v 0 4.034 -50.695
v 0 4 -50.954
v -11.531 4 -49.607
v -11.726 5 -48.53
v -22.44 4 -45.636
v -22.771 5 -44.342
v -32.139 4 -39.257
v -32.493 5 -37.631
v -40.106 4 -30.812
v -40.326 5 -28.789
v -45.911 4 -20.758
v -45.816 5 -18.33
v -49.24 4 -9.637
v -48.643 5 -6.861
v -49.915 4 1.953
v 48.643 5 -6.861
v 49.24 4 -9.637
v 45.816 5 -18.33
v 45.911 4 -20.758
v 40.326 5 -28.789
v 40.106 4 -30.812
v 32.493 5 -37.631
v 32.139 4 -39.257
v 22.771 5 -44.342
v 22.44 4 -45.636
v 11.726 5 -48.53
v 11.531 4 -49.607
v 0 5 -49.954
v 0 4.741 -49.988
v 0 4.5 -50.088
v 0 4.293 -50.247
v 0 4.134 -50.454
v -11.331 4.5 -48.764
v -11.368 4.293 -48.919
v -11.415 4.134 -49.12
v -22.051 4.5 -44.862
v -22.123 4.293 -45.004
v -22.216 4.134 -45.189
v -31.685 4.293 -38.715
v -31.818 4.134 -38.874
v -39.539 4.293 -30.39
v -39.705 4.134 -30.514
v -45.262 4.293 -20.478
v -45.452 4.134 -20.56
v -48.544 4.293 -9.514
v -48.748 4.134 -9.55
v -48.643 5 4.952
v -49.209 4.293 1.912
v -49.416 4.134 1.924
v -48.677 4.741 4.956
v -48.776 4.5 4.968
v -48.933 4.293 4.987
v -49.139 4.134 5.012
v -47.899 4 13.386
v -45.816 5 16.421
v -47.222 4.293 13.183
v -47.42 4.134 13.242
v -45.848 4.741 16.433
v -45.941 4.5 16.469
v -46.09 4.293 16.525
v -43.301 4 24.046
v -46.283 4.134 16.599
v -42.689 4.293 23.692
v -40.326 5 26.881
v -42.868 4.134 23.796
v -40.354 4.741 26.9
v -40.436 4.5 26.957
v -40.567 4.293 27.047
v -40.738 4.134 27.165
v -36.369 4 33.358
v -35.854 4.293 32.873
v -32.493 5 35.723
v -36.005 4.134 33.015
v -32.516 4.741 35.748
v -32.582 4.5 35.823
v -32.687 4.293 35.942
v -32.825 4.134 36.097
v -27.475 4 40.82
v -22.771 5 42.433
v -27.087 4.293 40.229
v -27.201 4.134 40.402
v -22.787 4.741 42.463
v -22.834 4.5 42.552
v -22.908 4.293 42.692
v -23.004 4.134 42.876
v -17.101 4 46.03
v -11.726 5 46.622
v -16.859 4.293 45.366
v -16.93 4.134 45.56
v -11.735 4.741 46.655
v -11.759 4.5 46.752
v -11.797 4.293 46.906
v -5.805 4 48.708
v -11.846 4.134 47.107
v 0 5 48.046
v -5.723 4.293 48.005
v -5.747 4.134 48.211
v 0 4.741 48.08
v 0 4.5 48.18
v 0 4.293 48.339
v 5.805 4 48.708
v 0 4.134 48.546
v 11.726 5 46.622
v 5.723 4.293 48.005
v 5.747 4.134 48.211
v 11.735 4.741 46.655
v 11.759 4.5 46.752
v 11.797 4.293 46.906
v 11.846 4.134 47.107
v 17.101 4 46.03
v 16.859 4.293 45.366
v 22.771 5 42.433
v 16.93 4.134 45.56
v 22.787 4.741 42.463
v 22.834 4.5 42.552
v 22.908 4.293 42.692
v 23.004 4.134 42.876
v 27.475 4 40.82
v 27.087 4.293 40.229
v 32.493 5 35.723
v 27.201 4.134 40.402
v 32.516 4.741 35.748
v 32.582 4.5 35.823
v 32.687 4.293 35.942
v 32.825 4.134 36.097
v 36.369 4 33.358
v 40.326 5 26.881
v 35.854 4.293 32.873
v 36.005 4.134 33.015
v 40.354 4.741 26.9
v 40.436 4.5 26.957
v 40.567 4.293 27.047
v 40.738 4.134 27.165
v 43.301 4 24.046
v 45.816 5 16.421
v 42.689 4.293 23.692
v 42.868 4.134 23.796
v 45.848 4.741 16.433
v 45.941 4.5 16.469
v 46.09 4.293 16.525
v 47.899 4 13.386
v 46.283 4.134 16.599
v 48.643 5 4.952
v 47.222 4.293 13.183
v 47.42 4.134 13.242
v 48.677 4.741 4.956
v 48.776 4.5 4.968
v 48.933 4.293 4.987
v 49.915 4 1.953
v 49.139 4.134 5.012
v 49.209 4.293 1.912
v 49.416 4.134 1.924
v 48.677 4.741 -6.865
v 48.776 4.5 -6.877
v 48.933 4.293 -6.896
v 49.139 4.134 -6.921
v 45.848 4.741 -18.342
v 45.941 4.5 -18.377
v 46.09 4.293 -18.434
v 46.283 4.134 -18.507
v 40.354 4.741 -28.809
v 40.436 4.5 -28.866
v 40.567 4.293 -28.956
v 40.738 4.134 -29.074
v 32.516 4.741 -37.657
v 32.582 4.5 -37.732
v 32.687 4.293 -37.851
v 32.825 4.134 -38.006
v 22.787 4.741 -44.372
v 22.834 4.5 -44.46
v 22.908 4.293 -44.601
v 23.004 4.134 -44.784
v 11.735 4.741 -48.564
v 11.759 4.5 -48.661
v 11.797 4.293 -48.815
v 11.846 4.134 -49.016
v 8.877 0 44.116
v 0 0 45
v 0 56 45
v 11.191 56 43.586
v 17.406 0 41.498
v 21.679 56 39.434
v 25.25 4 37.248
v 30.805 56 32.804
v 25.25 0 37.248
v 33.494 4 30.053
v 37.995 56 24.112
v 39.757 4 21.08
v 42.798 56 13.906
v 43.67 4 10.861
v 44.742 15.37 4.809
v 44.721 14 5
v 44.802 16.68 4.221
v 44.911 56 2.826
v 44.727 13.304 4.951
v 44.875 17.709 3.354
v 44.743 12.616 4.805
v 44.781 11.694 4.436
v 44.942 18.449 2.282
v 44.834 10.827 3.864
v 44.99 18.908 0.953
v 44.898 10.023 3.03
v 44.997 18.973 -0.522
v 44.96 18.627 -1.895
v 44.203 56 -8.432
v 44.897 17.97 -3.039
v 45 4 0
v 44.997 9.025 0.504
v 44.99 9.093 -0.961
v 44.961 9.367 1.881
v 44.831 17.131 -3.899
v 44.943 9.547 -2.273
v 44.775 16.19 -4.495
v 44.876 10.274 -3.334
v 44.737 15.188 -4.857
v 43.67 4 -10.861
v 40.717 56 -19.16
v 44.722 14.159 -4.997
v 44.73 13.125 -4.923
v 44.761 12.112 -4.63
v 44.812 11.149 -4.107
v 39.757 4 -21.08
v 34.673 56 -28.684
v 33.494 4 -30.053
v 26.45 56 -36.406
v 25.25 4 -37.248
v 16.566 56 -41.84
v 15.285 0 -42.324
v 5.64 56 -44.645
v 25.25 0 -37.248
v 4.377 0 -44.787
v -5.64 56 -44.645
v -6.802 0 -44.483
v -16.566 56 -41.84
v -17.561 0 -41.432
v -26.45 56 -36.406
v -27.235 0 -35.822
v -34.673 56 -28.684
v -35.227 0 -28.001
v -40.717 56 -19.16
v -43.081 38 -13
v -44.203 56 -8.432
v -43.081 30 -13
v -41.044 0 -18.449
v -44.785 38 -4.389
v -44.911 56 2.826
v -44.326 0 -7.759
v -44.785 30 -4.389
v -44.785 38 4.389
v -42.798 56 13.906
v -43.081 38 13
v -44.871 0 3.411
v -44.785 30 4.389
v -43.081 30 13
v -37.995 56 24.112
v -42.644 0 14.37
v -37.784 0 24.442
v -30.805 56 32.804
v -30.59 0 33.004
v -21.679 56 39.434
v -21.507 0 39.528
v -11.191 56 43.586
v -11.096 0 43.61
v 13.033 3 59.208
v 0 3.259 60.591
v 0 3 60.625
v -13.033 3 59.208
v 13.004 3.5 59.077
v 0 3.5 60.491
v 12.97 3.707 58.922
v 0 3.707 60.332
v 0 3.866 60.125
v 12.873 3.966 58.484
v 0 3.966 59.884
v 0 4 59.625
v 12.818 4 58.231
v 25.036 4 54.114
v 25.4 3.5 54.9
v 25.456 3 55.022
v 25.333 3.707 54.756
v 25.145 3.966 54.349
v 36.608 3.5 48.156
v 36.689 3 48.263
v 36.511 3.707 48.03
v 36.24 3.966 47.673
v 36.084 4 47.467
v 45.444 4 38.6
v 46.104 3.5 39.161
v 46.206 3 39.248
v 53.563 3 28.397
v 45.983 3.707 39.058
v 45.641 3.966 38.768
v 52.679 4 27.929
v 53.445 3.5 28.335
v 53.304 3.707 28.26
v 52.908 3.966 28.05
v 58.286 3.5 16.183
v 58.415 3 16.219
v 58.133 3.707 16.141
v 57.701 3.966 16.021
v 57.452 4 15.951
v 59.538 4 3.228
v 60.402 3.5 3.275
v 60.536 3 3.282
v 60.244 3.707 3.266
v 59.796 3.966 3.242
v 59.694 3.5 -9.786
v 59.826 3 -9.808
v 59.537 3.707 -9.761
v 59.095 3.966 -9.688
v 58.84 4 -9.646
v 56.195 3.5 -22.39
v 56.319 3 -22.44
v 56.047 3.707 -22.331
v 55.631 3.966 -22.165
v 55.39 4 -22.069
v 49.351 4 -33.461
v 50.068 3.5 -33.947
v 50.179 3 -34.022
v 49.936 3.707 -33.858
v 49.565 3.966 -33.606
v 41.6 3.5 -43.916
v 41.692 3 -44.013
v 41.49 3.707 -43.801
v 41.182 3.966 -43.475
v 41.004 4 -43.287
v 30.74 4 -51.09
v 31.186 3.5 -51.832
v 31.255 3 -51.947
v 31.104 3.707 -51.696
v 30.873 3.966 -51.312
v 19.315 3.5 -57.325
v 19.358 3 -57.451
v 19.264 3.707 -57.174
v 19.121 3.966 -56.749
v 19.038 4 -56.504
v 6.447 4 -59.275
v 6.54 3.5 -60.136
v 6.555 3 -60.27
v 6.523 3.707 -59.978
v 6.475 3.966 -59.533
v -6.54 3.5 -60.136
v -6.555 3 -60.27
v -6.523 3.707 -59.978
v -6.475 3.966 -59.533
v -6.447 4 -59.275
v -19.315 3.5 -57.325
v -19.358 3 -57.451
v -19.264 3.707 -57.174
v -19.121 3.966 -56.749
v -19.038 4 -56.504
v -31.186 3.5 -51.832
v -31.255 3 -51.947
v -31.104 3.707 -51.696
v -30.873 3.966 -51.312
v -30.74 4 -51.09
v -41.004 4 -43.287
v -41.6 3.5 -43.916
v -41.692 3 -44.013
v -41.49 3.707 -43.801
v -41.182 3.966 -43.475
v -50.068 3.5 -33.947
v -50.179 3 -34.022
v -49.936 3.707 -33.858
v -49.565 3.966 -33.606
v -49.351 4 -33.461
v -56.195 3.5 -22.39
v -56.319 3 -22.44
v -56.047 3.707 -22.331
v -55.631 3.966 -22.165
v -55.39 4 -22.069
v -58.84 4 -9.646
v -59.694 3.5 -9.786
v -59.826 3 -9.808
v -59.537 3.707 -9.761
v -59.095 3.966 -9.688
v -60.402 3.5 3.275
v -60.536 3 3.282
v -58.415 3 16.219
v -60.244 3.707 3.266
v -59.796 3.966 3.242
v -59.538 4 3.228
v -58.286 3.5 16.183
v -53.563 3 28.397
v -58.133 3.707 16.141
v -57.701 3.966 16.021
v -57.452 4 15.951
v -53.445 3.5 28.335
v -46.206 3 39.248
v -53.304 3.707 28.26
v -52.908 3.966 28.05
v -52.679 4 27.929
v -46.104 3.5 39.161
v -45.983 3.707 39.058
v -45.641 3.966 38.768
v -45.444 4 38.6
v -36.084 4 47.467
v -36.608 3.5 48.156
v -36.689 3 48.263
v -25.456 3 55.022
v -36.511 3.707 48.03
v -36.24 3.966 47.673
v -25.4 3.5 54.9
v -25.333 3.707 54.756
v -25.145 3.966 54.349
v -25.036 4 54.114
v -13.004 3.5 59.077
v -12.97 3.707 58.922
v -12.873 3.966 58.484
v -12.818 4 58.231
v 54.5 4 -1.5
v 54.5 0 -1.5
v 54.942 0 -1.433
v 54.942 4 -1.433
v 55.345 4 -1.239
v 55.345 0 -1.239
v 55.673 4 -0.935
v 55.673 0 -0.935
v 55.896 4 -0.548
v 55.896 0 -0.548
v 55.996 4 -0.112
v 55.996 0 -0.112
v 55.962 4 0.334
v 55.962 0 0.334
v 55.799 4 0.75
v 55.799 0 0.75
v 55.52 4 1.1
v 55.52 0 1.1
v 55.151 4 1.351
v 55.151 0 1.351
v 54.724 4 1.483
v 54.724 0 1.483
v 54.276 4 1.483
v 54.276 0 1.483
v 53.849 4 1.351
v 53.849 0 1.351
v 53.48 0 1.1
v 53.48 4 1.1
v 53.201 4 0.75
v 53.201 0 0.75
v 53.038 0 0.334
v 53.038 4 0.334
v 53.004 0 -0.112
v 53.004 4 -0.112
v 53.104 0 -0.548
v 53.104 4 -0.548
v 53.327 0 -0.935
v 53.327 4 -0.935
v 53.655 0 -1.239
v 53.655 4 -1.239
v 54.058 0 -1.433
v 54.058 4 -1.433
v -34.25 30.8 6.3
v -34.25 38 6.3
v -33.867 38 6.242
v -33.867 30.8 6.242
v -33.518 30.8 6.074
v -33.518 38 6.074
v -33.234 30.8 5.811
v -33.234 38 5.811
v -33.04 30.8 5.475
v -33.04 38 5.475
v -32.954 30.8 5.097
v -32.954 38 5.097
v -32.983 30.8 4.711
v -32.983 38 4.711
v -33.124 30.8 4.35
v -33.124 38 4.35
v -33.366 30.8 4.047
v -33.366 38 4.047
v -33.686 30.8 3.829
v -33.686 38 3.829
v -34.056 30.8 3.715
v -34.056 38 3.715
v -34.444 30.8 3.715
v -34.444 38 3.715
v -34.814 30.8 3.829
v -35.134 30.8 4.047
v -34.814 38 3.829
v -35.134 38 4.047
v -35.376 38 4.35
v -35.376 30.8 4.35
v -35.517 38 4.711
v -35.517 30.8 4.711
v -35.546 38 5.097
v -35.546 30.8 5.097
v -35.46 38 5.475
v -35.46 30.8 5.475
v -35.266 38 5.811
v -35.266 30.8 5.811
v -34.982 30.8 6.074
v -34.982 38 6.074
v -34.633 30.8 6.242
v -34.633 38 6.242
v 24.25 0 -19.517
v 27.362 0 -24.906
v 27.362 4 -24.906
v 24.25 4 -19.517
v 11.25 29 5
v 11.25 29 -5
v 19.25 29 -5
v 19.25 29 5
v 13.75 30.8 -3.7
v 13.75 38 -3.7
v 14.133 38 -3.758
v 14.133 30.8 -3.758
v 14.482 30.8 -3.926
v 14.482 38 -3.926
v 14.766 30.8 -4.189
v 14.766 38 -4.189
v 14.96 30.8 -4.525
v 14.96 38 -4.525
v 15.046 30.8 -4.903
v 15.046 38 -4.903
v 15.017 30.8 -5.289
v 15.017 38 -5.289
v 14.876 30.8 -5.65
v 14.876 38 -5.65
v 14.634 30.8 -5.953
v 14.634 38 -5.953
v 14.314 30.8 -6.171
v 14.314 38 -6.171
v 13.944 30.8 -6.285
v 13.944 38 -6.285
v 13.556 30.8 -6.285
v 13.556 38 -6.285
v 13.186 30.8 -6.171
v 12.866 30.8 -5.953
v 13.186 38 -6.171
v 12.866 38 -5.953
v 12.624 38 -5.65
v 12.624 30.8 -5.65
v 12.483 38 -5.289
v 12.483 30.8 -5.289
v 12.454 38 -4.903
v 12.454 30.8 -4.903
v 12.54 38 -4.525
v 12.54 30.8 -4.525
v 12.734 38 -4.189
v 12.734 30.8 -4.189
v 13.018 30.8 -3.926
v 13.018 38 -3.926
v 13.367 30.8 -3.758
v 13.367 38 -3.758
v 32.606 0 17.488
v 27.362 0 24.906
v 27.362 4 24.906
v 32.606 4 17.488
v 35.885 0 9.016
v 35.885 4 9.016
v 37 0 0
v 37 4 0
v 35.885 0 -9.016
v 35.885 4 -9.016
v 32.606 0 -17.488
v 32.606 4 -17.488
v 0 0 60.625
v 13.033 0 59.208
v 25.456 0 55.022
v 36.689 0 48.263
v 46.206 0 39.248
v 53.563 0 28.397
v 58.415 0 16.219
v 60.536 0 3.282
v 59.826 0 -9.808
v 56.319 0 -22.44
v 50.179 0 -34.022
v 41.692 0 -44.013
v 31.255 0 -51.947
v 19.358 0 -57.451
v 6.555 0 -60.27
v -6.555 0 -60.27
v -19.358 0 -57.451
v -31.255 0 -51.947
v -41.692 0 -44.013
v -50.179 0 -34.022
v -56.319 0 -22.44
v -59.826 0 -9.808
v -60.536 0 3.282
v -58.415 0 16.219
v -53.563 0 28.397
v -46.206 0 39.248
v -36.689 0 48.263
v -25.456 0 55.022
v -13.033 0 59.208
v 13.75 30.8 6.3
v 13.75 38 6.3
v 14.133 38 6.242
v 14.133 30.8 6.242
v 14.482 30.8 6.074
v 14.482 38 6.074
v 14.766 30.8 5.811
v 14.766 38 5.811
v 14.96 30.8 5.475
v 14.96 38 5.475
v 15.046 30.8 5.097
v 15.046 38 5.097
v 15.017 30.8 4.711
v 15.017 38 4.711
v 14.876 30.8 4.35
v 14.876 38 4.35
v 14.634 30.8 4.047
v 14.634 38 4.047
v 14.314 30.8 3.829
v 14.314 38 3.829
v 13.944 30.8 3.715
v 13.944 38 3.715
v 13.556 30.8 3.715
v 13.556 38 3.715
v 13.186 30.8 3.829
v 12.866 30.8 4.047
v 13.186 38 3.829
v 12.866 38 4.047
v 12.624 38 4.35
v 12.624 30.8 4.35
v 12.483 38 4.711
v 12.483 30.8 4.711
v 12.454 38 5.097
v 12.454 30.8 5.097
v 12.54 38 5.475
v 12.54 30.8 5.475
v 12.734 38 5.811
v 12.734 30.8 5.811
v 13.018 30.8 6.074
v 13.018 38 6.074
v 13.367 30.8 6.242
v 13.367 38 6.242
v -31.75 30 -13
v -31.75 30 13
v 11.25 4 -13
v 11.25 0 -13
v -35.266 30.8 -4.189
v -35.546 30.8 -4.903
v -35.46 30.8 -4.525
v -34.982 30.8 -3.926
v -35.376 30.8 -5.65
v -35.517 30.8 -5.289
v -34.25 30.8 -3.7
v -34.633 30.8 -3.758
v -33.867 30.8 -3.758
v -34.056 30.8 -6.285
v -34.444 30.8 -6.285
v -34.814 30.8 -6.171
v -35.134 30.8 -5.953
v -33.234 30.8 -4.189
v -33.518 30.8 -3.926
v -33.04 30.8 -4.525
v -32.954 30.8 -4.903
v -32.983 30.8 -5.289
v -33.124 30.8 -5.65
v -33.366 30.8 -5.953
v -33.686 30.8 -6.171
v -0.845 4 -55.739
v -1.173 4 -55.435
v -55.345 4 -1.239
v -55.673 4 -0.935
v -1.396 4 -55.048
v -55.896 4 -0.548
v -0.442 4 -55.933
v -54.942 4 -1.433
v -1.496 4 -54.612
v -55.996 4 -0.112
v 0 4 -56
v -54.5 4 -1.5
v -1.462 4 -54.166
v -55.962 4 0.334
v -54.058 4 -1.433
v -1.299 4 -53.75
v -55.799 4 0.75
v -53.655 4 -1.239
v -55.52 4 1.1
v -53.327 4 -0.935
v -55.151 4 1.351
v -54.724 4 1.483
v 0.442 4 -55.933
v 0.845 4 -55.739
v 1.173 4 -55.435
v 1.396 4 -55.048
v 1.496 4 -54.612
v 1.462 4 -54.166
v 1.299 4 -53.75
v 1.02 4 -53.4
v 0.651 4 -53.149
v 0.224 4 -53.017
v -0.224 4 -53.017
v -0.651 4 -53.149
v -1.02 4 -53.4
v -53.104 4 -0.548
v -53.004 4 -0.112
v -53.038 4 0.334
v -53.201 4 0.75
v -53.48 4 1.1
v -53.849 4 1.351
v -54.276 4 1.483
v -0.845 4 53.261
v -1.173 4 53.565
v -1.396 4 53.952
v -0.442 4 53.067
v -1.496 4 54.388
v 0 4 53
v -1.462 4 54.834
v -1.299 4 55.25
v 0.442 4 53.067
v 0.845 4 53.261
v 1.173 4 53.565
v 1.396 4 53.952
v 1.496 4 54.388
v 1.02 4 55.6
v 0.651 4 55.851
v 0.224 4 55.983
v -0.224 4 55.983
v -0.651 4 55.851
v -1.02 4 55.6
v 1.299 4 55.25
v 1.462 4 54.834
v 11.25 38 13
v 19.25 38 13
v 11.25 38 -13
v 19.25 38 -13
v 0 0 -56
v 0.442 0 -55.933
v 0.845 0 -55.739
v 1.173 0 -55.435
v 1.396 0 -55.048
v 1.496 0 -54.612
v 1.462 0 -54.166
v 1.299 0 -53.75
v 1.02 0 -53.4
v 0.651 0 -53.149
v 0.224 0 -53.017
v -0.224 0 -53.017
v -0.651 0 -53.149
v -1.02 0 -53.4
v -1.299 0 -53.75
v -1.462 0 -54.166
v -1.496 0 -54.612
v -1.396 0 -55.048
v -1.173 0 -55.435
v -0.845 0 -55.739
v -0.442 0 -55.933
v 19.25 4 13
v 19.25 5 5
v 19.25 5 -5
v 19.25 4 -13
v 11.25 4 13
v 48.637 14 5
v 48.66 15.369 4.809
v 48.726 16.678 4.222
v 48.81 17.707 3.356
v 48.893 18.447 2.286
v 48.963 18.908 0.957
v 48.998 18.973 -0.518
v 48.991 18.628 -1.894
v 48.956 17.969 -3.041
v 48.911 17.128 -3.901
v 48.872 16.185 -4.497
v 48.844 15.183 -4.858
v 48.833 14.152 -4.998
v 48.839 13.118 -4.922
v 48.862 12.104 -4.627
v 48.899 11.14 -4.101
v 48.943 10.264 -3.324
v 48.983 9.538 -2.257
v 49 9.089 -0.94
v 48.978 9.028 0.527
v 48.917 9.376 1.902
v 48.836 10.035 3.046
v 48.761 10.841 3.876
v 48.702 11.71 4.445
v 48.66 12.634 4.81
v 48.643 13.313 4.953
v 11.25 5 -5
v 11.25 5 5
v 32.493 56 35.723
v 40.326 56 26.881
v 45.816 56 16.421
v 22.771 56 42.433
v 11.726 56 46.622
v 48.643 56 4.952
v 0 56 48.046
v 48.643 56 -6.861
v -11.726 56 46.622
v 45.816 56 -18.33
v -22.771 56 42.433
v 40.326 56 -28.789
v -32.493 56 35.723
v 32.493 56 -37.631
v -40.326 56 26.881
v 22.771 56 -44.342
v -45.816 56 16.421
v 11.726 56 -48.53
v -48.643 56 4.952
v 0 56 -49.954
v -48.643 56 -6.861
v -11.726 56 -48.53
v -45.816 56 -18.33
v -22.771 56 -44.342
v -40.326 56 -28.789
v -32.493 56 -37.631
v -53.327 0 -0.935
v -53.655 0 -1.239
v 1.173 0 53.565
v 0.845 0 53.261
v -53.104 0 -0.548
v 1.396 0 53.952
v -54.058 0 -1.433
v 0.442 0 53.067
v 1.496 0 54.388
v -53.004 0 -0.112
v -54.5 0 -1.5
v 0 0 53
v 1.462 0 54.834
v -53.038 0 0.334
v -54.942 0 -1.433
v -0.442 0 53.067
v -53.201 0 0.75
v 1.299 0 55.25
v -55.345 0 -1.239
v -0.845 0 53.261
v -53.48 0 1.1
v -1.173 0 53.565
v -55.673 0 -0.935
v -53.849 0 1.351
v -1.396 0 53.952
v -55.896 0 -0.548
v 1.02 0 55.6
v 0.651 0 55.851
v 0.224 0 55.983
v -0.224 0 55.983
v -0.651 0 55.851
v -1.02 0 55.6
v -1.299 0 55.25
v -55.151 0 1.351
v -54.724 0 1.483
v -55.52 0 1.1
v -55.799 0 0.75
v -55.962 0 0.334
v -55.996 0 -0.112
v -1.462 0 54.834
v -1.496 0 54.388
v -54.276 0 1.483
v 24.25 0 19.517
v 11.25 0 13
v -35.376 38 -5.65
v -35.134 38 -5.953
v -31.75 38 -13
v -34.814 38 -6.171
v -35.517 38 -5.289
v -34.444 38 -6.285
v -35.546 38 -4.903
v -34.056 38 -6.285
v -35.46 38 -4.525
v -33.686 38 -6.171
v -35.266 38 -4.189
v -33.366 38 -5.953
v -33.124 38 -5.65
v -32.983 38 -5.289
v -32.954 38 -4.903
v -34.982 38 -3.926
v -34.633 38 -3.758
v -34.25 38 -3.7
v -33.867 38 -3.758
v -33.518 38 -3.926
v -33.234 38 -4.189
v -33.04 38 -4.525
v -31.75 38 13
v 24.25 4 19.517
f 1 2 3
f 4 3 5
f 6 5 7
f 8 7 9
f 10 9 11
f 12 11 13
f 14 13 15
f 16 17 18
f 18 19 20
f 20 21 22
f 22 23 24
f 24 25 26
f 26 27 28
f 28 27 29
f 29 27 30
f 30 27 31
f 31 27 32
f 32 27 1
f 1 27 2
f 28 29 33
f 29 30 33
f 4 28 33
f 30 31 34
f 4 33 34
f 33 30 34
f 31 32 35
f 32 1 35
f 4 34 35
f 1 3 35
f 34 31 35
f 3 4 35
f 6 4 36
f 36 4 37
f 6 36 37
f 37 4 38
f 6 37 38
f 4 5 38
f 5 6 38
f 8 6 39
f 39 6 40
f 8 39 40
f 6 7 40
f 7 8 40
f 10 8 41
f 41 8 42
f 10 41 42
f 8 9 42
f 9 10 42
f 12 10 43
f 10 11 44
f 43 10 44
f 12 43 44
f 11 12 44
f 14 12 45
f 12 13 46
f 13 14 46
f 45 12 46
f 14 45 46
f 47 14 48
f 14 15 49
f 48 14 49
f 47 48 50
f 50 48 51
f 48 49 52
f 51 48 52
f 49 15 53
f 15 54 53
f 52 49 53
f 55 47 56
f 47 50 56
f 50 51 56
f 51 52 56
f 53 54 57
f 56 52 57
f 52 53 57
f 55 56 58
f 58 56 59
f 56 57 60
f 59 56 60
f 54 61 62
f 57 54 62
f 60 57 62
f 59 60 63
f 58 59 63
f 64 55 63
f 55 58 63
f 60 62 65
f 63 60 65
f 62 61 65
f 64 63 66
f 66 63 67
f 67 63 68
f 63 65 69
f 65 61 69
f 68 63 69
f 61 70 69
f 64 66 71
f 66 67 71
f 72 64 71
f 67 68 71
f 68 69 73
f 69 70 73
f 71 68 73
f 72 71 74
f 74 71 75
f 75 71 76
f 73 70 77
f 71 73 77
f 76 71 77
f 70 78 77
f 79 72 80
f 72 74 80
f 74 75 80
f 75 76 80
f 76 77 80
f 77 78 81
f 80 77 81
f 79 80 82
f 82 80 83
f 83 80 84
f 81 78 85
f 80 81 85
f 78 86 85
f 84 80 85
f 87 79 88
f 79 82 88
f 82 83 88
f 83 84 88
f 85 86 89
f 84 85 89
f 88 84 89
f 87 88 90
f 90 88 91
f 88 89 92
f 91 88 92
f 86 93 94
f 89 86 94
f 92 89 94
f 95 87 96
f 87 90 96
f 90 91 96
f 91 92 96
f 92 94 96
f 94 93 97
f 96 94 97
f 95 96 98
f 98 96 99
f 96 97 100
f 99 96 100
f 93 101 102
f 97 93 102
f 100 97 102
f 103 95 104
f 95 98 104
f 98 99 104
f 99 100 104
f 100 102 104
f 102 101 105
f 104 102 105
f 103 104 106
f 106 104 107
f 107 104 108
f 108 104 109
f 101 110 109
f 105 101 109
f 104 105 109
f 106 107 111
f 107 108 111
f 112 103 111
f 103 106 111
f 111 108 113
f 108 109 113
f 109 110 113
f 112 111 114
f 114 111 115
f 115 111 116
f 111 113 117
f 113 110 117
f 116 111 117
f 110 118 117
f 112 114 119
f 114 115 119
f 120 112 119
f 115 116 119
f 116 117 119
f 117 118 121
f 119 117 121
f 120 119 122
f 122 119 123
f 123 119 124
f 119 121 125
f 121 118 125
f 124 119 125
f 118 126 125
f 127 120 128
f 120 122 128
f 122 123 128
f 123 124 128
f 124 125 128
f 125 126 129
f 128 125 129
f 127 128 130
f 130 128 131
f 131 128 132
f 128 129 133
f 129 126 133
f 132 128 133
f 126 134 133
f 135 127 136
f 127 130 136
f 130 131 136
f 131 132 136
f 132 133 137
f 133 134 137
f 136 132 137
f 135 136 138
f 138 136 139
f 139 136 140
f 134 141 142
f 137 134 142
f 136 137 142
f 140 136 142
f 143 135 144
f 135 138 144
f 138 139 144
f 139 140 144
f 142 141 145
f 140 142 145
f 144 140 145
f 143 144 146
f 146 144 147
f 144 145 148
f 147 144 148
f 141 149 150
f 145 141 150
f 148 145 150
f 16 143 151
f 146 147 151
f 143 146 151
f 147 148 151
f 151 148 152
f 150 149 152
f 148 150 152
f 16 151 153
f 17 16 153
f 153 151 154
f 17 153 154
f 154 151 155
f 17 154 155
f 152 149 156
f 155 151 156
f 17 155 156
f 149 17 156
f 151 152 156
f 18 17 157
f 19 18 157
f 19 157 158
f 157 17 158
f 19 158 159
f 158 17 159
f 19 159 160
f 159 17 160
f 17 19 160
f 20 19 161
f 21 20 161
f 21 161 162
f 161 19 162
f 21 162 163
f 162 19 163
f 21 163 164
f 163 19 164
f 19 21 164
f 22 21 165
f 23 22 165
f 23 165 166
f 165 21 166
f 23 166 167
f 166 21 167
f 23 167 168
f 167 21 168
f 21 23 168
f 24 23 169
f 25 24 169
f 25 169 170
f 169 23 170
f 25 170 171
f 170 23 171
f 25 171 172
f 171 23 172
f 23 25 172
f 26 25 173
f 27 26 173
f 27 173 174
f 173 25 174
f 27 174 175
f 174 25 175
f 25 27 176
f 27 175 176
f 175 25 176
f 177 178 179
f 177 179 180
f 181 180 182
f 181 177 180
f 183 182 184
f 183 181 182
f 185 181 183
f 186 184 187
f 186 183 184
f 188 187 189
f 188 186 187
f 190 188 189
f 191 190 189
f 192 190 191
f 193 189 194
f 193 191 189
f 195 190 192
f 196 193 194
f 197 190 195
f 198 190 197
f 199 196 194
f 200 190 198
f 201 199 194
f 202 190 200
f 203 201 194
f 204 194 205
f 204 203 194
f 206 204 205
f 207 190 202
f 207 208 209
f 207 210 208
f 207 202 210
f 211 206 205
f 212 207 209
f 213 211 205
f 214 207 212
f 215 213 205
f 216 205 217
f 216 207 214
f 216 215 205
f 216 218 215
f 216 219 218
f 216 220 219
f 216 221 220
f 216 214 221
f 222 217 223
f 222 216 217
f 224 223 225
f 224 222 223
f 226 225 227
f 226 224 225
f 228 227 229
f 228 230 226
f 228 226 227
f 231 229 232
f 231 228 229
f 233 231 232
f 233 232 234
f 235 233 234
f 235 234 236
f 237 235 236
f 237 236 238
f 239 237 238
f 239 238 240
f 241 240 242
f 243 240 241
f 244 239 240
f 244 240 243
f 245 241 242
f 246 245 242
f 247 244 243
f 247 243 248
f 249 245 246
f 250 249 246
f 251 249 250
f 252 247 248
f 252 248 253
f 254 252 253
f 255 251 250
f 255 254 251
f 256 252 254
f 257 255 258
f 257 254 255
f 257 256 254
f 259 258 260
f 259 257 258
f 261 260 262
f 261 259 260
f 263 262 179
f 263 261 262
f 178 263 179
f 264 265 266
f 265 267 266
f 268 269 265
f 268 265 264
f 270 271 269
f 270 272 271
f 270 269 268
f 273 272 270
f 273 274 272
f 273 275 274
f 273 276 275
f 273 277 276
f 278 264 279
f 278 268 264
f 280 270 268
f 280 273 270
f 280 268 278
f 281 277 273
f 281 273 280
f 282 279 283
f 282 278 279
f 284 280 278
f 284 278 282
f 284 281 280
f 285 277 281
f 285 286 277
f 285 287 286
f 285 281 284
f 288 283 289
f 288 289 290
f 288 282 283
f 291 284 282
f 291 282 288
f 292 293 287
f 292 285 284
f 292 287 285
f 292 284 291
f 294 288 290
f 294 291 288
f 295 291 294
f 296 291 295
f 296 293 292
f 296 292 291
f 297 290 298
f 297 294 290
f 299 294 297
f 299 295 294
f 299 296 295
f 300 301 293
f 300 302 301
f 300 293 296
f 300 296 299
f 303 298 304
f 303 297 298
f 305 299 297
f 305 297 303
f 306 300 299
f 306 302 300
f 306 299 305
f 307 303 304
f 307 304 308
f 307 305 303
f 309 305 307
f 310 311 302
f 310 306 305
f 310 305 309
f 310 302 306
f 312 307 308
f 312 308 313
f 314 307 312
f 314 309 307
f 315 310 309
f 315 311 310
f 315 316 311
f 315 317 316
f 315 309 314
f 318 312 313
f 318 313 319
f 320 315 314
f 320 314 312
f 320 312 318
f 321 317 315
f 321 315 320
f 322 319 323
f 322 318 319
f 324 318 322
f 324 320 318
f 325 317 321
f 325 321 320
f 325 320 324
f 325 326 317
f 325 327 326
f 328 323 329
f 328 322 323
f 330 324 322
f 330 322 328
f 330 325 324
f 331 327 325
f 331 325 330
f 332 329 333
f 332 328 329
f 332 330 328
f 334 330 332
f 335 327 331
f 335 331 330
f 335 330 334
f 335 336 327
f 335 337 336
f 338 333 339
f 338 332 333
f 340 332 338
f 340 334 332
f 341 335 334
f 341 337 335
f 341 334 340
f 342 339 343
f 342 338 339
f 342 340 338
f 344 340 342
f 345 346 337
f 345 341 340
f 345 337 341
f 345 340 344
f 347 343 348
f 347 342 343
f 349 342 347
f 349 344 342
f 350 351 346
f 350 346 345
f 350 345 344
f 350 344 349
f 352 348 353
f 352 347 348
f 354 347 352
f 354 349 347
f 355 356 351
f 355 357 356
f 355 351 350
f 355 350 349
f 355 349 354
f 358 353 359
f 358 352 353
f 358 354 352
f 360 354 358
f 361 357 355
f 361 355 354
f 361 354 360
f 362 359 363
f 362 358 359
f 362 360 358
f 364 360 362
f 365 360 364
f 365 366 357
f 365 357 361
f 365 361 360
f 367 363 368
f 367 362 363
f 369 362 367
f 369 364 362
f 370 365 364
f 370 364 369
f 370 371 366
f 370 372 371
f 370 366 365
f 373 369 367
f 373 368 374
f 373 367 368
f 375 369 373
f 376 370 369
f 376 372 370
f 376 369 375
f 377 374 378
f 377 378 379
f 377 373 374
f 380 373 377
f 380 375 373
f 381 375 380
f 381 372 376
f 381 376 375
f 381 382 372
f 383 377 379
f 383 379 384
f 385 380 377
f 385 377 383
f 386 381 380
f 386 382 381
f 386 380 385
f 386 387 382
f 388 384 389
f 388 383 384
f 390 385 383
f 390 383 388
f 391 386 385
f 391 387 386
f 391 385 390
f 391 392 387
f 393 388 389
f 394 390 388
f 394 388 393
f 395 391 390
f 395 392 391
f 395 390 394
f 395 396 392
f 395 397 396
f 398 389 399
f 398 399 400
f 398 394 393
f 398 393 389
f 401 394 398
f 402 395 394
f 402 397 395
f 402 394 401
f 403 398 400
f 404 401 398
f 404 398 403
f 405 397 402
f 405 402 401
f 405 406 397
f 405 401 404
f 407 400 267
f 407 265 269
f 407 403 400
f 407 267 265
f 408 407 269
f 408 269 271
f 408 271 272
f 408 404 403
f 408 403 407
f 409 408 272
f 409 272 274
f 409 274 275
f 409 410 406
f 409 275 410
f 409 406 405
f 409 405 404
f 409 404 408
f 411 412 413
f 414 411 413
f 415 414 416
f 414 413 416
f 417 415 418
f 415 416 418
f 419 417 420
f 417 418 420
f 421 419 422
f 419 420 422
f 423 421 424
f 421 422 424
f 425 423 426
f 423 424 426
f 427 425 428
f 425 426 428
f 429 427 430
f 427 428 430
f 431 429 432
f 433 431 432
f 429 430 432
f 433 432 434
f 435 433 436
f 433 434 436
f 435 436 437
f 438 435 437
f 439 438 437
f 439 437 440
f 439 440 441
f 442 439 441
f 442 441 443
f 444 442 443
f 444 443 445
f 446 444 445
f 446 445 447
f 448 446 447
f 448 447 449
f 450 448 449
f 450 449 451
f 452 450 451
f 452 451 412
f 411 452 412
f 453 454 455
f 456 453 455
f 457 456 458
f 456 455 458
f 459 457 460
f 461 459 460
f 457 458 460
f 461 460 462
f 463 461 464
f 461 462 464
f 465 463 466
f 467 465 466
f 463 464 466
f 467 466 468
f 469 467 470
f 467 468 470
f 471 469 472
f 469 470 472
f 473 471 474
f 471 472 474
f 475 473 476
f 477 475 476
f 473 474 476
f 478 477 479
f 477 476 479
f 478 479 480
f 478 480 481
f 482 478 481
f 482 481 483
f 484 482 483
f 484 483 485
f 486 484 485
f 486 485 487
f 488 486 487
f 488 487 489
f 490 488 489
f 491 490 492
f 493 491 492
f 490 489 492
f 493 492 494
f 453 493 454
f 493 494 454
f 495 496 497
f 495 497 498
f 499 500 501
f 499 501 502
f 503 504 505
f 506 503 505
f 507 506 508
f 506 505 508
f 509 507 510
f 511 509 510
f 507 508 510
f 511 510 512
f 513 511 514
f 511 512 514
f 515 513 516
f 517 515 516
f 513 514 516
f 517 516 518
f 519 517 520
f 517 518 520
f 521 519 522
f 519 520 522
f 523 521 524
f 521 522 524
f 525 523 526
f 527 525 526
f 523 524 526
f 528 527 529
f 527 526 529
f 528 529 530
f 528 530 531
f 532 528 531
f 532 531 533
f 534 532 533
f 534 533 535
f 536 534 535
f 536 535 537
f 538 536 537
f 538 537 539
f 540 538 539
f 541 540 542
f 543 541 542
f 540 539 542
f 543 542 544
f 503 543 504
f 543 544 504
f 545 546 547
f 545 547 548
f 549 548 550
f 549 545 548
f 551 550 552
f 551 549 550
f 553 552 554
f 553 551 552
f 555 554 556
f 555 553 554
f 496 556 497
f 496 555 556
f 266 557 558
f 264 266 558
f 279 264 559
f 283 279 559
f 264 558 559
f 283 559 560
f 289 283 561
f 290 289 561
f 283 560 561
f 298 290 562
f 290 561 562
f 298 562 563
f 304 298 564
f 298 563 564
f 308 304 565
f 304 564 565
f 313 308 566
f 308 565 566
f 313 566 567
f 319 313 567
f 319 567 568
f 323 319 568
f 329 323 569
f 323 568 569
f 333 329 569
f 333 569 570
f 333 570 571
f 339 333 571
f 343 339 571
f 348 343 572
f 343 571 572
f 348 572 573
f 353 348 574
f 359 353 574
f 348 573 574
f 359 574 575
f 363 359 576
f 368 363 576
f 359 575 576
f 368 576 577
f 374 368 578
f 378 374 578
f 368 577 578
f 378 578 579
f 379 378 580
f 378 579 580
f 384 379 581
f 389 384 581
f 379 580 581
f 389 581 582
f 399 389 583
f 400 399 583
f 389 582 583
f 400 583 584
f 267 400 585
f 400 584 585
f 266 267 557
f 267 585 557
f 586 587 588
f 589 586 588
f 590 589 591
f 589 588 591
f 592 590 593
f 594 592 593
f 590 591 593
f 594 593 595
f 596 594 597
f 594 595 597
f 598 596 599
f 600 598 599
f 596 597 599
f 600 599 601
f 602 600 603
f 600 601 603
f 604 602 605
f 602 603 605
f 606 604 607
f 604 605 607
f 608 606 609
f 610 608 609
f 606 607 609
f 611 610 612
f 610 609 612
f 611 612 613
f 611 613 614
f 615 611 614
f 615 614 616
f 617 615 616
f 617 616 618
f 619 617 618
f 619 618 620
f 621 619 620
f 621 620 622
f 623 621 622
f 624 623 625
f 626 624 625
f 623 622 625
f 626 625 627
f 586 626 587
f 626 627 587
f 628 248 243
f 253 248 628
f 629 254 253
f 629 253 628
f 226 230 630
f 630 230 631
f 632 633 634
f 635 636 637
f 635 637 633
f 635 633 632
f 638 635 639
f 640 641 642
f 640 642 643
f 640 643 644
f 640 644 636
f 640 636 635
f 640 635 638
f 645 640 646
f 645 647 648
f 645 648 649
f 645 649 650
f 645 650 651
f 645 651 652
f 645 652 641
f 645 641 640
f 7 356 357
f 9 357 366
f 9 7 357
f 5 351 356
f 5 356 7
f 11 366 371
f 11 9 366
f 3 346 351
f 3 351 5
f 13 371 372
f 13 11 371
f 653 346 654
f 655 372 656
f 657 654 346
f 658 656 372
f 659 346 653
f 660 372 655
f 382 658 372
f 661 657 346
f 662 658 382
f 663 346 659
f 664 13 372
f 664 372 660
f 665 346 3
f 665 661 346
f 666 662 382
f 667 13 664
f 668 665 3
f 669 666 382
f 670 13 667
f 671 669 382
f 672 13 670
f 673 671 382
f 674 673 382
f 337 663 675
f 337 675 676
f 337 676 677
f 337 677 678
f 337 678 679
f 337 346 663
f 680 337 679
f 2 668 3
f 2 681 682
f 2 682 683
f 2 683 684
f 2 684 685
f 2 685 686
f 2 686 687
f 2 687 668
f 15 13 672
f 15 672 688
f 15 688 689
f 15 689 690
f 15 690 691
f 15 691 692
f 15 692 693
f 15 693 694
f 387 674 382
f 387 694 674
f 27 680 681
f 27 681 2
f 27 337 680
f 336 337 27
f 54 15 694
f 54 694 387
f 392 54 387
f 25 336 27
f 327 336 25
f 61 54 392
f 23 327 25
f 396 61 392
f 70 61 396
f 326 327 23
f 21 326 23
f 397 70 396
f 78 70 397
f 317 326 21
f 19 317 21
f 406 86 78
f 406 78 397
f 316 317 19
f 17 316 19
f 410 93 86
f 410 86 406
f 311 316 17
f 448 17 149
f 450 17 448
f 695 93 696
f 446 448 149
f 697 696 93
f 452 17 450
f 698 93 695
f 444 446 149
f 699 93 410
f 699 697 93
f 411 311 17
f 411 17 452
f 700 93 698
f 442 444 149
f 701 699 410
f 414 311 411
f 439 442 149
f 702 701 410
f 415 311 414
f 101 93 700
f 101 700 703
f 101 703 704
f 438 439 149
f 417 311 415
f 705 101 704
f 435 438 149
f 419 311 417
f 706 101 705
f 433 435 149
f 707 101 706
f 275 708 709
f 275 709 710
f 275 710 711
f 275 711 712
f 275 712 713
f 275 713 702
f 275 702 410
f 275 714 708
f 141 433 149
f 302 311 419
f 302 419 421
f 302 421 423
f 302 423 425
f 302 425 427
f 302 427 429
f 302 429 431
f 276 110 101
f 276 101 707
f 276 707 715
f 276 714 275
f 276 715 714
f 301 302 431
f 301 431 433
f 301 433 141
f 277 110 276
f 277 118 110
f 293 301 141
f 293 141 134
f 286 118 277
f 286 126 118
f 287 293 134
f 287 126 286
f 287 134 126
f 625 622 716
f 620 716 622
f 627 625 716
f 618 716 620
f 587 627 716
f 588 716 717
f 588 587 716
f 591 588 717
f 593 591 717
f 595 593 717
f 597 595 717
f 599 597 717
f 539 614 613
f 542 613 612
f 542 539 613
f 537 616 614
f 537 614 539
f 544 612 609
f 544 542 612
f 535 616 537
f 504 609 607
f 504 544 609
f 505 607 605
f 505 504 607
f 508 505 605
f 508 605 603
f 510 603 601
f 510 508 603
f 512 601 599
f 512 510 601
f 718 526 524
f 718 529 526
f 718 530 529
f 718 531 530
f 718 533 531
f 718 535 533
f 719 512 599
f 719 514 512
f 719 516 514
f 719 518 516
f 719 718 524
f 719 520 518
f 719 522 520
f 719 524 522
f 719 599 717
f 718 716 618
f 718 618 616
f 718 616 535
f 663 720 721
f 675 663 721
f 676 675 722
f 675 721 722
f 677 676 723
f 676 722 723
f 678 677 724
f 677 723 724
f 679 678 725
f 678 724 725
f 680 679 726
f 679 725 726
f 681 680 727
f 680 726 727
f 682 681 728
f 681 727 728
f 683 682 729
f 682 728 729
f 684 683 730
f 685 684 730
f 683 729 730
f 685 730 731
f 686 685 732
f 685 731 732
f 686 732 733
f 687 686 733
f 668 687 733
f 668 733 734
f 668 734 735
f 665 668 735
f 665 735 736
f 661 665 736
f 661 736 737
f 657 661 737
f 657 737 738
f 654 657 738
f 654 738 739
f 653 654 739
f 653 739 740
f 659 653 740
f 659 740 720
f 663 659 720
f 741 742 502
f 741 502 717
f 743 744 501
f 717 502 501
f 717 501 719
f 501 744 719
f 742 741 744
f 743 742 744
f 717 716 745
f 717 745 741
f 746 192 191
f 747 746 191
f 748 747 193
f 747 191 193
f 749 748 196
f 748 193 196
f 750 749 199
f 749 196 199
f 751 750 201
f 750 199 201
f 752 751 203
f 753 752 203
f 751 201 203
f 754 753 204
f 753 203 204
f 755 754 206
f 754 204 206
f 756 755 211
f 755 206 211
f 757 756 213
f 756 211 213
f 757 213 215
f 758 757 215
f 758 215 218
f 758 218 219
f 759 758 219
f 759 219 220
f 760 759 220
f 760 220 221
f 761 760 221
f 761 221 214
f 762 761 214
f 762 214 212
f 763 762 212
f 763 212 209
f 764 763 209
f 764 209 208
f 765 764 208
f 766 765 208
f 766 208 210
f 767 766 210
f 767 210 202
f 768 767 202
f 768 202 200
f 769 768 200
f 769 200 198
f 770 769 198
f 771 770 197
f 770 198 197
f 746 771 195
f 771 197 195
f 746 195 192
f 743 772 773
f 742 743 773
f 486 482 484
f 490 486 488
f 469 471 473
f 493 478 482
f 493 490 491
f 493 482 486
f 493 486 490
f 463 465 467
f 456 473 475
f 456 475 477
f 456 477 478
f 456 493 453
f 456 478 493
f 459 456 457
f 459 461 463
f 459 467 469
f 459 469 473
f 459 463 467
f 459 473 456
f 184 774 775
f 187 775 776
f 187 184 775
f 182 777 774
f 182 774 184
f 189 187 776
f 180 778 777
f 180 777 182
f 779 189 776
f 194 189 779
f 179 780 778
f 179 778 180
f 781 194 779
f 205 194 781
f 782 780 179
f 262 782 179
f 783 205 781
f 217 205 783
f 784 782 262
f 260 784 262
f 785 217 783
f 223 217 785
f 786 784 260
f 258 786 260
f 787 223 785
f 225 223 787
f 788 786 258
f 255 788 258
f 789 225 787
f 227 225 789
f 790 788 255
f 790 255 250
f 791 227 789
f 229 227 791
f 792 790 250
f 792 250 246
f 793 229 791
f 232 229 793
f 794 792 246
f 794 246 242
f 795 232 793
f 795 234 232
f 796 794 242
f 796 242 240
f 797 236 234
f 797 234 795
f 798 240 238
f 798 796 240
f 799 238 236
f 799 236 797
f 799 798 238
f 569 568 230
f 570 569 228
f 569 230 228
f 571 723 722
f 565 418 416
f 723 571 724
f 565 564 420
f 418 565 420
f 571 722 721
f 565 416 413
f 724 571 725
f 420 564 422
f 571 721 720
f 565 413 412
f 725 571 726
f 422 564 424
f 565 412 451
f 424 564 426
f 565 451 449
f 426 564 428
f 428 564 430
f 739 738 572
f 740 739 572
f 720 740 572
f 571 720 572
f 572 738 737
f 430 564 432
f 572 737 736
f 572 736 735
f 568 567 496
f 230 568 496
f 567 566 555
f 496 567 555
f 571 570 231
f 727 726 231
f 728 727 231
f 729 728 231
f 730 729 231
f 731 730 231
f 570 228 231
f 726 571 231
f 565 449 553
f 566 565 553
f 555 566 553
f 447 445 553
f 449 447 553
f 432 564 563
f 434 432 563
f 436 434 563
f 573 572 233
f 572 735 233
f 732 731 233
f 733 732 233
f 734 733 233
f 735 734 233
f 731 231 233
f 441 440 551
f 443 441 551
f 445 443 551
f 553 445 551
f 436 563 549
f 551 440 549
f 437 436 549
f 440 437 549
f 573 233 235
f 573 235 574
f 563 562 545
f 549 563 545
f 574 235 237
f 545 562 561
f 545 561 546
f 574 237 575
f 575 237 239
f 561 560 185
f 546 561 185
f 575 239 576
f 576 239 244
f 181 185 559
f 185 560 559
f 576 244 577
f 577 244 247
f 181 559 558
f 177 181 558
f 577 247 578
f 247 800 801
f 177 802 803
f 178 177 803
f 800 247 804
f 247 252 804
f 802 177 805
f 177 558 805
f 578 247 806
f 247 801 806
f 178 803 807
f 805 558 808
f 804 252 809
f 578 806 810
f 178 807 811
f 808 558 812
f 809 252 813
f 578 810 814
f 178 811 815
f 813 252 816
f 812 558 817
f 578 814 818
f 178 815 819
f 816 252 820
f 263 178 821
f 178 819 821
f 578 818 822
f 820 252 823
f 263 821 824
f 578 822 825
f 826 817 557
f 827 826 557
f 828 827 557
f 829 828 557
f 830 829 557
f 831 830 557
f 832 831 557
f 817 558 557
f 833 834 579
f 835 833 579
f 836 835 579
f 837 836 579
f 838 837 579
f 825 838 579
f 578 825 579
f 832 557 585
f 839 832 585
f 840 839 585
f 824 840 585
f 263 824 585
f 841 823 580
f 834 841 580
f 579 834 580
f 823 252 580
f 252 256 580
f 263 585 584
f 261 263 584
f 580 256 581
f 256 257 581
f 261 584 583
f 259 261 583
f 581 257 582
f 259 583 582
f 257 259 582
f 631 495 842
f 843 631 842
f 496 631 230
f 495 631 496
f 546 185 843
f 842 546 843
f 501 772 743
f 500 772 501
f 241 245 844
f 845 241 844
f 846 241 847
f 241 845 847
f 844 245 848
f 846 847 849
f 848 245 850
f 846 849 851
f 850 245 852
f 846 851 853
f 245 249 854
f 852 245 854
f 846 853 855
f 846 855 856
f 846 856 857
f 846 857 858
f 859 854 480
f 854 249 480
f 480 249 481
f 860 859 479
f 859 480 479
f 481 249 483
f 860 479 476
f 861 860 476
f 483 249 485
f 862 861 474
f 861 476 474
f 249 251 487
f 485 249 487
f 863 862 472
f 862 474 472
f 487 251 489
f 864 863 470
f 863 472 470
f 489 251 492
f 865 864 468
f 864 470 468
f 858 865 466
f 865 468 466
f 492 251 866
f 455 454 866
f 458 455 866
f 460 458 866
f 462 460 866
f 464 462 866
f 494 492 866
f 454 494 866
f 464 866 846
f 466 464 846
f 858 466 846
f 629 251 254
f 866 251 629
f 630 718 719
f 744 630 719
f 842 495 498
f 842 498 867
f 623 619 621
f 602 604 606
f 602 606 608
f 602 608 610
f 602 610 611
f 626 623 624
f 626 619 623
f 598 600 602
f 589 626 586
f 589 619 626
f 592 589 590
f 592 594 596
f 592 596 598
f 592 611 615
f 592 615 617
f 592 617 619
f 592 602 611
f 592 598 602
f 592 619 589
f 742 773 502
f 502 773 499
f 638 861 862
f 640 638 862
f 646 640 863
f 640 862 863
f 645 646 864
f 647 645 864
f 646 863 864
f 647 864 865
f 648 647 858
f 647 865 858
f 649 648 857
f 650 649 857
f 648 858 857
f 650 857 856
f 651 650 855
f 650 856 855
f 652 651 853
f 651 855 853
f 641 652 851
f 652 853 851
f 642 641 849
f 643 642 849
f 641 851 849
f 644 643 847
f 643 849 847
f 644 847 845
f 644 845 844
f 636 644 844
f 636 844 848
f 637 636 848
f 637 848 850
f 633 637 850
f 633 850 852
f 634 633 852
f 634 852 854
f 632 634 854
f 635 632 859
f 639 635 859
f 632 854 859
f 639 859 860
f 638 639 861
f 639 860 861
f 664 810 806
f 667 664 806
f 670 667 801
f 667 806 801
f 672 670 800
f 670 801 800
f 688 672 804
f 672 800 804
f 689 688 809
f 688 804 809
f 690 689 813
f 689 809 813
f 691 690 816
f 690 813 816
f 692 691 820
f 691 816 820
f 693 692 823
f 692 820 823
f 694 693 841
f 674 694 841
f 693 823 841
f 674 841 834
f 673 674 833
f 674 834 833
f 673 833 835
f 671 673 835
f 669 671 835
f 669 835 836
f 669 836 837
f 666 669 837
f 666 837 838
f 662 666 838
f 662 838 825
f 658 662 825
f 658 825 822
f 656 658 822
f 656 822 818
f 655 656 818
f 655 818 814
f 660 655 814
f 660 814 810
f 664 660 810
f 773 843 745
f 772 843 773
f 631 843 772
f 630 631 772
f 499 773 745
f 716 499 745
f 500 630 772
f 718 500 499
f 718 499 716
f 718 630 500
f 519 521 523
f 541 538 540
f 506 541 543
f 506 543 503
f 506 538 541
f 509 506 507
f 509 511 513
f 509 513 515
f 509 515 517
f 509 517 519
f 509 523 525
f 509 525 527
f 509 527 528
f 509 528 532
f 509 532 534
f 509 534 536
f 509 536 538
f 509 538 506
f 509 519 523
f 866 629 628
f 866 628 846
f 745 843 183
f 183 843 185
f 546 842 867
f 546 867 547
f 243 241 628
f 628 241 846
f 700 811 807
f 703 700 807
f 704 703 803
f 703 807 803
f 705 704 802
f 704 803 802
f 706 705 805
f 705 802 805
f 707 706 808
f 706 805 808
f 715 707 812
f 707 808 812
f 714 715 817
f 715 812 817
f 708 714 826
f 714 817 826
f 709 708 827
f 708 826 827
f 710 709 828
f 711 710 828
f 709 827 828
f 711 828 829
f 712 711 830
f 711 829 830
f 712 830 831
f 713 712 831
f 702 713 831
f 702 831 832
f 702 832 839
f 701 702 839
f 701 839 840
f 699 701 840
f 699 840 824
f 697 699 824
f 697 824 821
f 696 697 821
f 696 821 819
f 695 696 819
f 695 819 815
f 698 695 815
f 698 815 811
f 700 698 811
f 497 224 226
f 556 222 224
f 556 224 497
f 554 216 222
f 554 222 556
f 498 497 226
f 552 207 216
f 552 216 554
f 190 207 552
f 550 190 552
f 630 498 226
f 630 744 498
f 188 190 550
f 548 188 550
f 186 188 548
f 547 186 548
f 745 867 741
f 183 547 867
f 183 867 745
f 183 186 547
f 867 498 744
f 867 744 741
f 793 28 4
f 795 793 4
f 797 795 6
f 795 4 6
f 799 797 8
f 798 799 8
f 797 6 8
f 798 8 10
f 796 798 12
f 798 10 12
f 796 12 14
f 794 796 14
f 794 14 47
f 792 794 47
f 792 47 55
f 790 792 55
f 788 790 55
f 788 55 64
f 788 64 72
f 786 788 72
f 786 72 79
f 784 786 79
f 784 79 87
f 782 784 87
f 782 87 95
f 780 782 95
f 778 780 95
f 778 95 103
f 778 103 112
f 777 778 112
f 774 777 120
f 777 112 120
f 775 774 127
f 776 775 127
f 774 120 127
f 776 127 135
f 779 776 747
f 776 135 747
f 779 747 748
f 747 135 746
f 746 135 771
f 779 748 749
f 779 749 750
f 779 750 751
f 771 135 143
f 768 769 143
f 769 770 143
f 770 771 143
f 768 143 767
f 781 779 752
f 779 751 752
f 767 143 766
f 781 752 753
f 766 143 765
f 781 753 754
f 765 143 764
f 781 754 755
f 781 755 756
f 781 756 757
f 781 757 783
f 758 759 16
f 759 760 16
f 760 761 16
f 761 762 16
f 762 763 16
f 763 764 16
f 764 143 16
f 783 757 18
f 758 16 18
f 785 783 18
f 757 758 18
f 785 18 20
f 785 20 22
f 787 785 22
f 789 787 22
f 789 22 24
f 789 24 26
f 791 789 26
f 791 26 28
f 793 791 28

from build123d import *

# Parameters (mm, degrees)
SKETCH2_R           = 60.625
SKETCH2_R_2         = 45
BOSS_EXTRUDE1_DEPTH = 4
SKETCH4_R           = 49
SKETCH4_R_2         = 45
BOSS_EXTRUDE2_DEPTH = 52
SKETCH5_W           = 8
SKETCH5_H           = 38
SKETCH5_W_2         = 15
SKETCH5_H_2         = 8
BOSS_EXTRUDE3_DEPTH = 13
SKETCH6_W           = 10
SKETCH6_H           = 24
CUT_EXTRUDE2_DEPTH  = 8
SKETCH7_R           = 5
CUT_EXTRUDE3_DEPTH  = 110.441337026
SKETCH8_R           = 1.3
CUT_EXTRUDE4_DEPTH  = 7.2
BOSS_EXTRUDE4_DEPTH = 4
SKETCH10_R          = 1.5
CUT_EXTRUDE5_DEPTH  = 103.404986506
FILLET1_R           = 1


with BuildPart() as part:
    # Sketch2 → Boss-Extrude1 (new body)
    with BuildSketch(Plane(origin=(0, 0, 0), x_dir=(1, 0, 0), z_dir=(0, 1, 0))):
        with Locations(Location((0, 0, 0), (0, 0, 270))):
            Circle(SKETCH2_R)
        with Locations(Location((0, 0, 0), (0, 0, 270))):
            Circle(SKETCH2_R_2, mode=Mode.SUBTRACT)
    extrude(amount=BOSS_EXTRUDE1_DEPTH)

    # Sketch4 → Boss-Extrude2 (add)
    with BuildSketch(Plane(origin=(0, 4, 0), x_dir=(1, 0, 0), z_dir=(0, 1, 0))):
        with Locations(Location((0, 0.954313472, 0), (0, 0, 90))):
            Circle(SKETCH4_R)
        with Locations(Location((0, 0, 0), (0, 0, 270))):
            Circle(SKETCH4_R_2, mode=Mode.SUBTRACT)
    extrude(amount=BOSS_EXTRUDE2_DEPTH)

    # Sketch5 → Boss-Extrude3 (add, symmetric)
    with BuildSketch(Plane.XY):
        with Locations((15.25, 19)):
            Rectangle(SKETCH5_W, SKETCH5_H)
        with Locations((-39.25, 34)):
            Rectangle(SKETCH5_W_2, SKETCH5_H_2)
    extrude(amount=BOSS_EXTRUDE3_DEPTH, both=True)


with BuildPart() as boss_extrude3_piece_1:
    # of the separate pieces the step leaves, piece 1, a body of its own (boss_extrude3_pieces)
    add(part.part.solids().sort_by_distance((0, 0, 60.625))[0])

    # Sketch7 → Cut-Extrude3 (cut, through all)
    with BuildSketch(Plane.ZY.offset(-11.25)):
        with Locations((0, 14)):
            Circle(SKETCH7_R)
    extrude(amount=-CUT_EXTRUDE3_DEPTH, mode=Mode.SUBTRACT)


with BuildPart() as boss_extrude3_piece_2:
    # of the separate pieces the step leaves, piece 2, a body of its own (boss_extrude3_pieces)
    add(part.part.solids().sort_by_distance((11.25, 0, -13))[0])

    # Sketch6 → Cut-Extrude2 (cut)
    with BuildSketch(Plane.ZY.offset(-11.25)):
        with Locations((0, 17)):
            Rectangle(SKETCH6_W, SKETCH6_H)
    extrude(amount=-CUT_EXTRUDE2_DEPTH, mode=Mode.SUBTRACT)


with BuildPart() as cut_extrude4_tool:
    # Sketch8 → Cut-Extrude4 (new body)
    with BuildSketch(Plane(origin=(0, 38, 0), x_dir=(1, 0, 0), z_dir=(0, 1, 0))):
        with Locations(Location((-34.25, 5, 0), (0, 0, 270))):
            Circle(SKETCH8_R)
        with Locations(Location((-34.25, -5, 0), (0, 0, 270))):
            Circle(SKETCH8_R)
        with Locations(Location((13.75, -5, 0), (0, 0, 270))):
            Circle(SKETCH8_R)
        with Locations(Location((13.75, 5, 0), (0, 0, 270))):
            Circle(SKETCH8_R)
    extrude(amount=-CUT_EXTRUDE4_DEPTH)


with BuildPart() as boss_extrude3_piece_1_1:
    add(boss_extrude3_piece_1.part)

    # Cut-Extrude4: cut by cut_extrude4_tool
    add(cut_extrude4_tool.part, mode=Mode.SUBTRACT)



with BuildPart() as boss_extrude3_piece_2_1:
    add(boss_extrude3_piece_2.part)

    # Cut-Extrude4: cut by cut_extrude4_tool
    add(cut_extrude4_tool.part, mode=Mode.SUBTRACT)


with BuildPart() as boss_extrude3_piece_1_2:
    add(boss_extrude3_piece_1_1.part)

    add(boss_extrude3_piece_2_1.part)  # Boss-Extrude4 merges Boss-Extrude3 piece 2
    # Sketch9 → Boss-Extrude4 (add)
    with BuildSketch(Plane.XZ):
        with BuildLine():
            Line((11.25, 13), (25.249838503, 37.248431585))
            ThreePointArc((25.249838503, 37.248431585), (45, 0), (25.249838503, -37.248431585))
            Line((25.249838503, -37.248431585), (11.25, -13))
            Line((11.25, -13), (11.25, 13))
        make_face()
        with BuildLine():
            Line((24.25, 19.516660498), (27.361802413, 24.906460381))
            ThreePointArc((27.361802413, 24.906460381), (37, 0), (27.361802413, -24.906460381))
            Line((27.361802413, -24.906460381), (24.25, -19.516660498))
            Line((24.25, -19.516660498), (24.25, 19.516660498))
        make_face(mode=Mode.SUBTRACT)
    extrude(amount=-BOSS_EXTRUDE4_DEPTH)

    # Sketch10 → Cut-Extrude5 (cut, through all)
    with BuildSketch(Plane.XZ):
        with Locations(Location((54.5, 0, 0), (0, 0, 270))):
            Circle(SKETCH10_R)
        with Locations(Location((0, -54.5, 0), (0, 0, 270))):
            Circle(SKETCH10_R)
        with Locations(Location((-54.5, 0, 0), (0, 0, 270))):
            Circle(SKETCH10_R)
        with Locations(Location((0, 54.5, 0), (0, 0, 270))):
            Circle(SKETCH10_R)
    extrude(amount=-CUT_EXTRUDE5_DEPTH, mode=Mode.SUBTRACT)

    # Fillet1
    fillet1_edges = [boss_extrude3_piece_1_2.edges().sort_by_distance(p)[0] for p in [
        (0, 4, -60.625),
        (0, 4, 48.045686528),
    ]]
    fillet(fillet1_edges, radius=FILLET1_R)


solid = boss_extrude3_piece_1_2.part
